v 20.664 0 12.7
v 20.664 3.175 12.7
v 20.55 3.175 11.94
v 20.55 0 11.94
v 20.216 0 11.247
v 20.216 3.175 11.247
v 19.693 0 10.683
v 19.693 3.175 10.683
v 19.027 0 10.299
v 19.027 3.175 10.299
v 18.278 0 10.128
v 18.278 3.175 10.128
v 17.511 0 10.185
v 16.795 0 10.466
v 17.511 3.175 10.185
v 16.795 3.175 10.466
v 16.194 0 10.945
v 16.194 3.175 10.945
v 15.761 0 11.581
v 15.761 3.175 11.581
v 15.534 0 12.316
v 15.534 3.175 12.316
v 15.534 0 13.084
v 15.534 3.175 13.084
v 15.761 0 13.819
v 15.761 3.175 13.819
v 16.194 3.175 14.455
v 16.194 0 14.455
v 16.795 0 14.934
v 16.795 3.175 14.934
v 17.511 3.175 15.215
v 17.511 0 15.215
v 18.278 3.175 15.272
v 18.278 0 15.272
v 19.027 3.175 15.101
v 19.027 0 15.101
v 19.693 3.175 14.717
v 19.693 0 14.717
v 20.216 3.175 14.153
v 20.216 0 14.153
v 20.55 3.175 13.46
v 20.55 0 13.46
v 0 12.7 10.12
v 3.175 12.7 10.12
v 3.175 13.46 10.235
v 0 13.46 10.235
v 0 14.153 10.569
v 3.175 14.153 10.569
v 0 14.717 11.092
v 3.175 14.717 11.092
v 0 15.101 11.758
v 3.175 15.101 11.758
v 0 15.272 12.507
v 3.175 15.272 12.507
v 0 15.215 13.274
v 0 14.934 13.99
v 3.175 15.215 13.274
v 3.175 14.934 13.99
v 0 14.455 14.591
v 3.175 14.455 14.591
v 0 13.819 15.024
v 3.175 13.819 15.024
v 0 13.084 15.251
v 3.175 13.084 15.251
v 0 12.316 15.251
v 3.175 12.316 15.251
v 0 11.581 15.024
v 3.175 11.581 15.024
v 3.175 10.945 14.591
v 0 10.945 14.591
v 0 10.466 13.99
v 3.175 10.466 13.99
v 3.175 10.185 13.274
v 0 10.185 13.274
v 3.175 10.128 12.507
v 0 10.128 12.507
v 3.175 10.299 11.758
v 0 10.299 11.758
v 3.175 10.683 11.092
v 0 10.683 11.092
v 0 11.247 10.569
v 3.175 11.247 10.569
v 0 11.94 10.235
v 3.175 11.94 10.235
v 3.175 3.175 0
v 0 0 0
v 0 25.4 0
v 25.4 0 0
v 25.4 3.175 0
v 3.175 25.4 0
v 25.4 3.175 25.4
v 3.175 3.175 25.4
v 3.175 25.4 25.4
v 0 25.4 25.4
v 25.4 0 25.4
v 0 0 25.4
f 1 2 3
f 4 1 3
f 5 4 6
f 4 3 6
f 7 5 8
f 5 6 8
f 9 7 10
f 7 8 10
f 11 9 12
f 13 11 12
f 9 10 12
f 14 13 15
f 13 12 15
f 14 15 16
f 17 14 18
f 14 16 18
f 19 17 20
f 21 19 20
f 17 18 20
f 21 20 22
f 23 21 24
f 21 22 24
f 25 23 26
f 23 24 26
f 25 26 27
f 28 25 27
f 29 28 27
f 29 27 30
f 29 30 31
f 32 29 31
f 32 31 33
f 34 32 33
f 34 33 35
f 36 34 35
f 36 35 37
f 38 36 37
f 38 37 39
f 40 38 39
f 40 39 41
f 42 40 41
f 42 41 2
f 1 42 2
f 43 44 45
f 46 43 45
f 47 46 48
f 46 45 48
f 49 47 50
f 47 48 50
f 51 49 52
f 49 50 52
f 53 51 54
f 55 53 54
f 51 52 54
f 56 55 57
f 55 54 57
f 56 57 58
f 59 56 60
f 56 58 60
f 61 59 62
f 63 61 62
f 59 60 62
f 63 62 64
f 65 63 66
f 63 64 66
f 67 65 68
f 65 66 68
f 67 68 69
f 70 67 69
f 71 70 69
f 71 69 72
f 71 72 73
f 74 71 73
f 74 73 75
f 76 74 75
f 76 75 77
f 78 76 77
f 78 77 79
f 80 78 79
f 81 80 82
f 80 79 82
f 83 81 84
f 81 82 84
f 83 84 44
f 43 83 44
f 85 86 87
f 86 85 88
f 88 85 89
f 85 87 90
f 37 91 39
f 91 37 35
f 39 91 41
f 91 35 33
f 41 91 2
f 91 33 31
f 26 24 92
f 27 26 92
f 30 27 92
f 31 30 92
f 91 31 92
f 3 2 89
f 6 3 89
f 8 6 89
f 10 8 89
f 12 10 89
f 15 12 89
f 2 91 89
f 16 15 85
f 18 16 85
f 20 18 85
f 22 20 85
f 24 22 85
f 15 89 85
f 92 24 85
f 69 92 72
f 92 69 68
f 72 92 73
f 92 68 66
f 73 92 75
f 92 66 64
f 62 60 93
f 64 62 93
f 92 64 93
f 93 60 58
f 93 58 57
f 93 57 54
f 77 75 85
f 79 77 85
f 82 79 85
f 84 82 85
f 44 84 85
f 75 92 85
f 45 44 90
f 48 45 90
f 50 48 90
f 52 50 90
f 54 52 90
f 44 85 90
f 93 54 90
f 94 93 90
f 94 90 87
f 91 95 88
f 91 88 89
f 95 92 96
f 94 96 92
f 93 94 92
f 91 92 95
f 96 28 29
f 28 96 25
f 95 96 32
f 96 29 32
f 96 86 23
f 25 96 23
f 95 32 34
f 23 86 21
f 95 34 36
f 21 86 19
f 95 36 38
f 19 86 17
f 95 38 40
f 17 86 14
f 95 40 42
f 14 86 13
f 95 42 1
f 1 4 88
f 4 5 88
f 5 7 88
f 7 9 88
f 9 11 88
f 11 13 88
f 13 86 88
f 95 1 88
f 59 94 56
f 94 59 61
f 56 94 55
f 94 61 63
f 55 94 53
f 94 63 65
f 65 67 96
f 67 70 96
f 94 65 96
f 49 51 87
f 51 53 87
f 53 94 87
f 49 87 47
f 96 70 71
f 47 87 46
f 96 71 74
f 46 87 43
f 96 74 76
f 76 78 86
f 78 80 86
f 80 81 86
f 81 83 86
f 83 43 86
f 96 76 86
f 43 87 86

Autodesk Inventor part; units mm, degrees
ref_plane "YZ Plane" through (0, 0, 0) normal (1, 0, 0) x (0, 1, 0)
ref_plane "XZ Plane" through (0, 0, 0) normal (0, 1, 0) x (-1, 0, 0)
ref_plane "XY Plane" through (0, 0, 0) normal (0, 0, 1) x (1, 0, 0)
sketch "Sketch1" plane through (0, 0, 0) normal (0, 0, 1) x (1, 0, 0)
  line L0 (0, 0) -> (3.175, 0)
  line L1 (3.175, 0) -> (3.175, 25.4)
  line L2 (3.175, 25.4) -> (0, 25.4)
  line L3 (0, 25.4) -> (0, 0)
  line L4 (0, 0) -> (25.4, 0)
  line L5 (25.4, 0) -> (25.4, 3.175)
  line L6 (25.4, 3.175) -> (0, 3.175)
  line L7 (0, 3.175) -> (0, 0)
  dimension "d0" = 3.175
  dimension "d1" = 25.4
  dimension "d2" = 25.4
  dimension "d3" = 3.175
extrude "Extrusion1" add sketch "Sketch1" along normal blind 25.4
sketch "Sketch2" plane through (3.175, 3.175, 0) normal (1, 0, 0) x (0, 0, -1)
  line L0 (0, 22.225) -> (-25.4, 22.225) construction
  line L1 (-12.7, 22.225) -> (-12.7, 9.525) construction
  circle A0 centre (-12.7, 9.525) radius 2.5797
  point P0 (0, -3.175)
  dimension "d6" = 12.7
  dimension "d7" = 5.1594
extrude "Extrusion2" cut sketch "Sketch2" against normal blind 25.4
sketch "Sketch3" plane through (3.175, 3.175, 0) normal (0, 1, 0) x (1, 0, 0)
  line L0 (-3.175, 0) -> (-3.175, -25.4) construction
  line L1 (-3.175, -12.7) -> (14.9098, -12.7) construction
  circle A0 centre (14.9098, -12.7) radius 2.5797
  dimension "d10" = 18.0848
  dimension "d11" = 5.1594
extrude "Extrusion3" cut sketch "Sketch3" against normal blind 25.4
properties part number "L-Bracket Gearbox"
